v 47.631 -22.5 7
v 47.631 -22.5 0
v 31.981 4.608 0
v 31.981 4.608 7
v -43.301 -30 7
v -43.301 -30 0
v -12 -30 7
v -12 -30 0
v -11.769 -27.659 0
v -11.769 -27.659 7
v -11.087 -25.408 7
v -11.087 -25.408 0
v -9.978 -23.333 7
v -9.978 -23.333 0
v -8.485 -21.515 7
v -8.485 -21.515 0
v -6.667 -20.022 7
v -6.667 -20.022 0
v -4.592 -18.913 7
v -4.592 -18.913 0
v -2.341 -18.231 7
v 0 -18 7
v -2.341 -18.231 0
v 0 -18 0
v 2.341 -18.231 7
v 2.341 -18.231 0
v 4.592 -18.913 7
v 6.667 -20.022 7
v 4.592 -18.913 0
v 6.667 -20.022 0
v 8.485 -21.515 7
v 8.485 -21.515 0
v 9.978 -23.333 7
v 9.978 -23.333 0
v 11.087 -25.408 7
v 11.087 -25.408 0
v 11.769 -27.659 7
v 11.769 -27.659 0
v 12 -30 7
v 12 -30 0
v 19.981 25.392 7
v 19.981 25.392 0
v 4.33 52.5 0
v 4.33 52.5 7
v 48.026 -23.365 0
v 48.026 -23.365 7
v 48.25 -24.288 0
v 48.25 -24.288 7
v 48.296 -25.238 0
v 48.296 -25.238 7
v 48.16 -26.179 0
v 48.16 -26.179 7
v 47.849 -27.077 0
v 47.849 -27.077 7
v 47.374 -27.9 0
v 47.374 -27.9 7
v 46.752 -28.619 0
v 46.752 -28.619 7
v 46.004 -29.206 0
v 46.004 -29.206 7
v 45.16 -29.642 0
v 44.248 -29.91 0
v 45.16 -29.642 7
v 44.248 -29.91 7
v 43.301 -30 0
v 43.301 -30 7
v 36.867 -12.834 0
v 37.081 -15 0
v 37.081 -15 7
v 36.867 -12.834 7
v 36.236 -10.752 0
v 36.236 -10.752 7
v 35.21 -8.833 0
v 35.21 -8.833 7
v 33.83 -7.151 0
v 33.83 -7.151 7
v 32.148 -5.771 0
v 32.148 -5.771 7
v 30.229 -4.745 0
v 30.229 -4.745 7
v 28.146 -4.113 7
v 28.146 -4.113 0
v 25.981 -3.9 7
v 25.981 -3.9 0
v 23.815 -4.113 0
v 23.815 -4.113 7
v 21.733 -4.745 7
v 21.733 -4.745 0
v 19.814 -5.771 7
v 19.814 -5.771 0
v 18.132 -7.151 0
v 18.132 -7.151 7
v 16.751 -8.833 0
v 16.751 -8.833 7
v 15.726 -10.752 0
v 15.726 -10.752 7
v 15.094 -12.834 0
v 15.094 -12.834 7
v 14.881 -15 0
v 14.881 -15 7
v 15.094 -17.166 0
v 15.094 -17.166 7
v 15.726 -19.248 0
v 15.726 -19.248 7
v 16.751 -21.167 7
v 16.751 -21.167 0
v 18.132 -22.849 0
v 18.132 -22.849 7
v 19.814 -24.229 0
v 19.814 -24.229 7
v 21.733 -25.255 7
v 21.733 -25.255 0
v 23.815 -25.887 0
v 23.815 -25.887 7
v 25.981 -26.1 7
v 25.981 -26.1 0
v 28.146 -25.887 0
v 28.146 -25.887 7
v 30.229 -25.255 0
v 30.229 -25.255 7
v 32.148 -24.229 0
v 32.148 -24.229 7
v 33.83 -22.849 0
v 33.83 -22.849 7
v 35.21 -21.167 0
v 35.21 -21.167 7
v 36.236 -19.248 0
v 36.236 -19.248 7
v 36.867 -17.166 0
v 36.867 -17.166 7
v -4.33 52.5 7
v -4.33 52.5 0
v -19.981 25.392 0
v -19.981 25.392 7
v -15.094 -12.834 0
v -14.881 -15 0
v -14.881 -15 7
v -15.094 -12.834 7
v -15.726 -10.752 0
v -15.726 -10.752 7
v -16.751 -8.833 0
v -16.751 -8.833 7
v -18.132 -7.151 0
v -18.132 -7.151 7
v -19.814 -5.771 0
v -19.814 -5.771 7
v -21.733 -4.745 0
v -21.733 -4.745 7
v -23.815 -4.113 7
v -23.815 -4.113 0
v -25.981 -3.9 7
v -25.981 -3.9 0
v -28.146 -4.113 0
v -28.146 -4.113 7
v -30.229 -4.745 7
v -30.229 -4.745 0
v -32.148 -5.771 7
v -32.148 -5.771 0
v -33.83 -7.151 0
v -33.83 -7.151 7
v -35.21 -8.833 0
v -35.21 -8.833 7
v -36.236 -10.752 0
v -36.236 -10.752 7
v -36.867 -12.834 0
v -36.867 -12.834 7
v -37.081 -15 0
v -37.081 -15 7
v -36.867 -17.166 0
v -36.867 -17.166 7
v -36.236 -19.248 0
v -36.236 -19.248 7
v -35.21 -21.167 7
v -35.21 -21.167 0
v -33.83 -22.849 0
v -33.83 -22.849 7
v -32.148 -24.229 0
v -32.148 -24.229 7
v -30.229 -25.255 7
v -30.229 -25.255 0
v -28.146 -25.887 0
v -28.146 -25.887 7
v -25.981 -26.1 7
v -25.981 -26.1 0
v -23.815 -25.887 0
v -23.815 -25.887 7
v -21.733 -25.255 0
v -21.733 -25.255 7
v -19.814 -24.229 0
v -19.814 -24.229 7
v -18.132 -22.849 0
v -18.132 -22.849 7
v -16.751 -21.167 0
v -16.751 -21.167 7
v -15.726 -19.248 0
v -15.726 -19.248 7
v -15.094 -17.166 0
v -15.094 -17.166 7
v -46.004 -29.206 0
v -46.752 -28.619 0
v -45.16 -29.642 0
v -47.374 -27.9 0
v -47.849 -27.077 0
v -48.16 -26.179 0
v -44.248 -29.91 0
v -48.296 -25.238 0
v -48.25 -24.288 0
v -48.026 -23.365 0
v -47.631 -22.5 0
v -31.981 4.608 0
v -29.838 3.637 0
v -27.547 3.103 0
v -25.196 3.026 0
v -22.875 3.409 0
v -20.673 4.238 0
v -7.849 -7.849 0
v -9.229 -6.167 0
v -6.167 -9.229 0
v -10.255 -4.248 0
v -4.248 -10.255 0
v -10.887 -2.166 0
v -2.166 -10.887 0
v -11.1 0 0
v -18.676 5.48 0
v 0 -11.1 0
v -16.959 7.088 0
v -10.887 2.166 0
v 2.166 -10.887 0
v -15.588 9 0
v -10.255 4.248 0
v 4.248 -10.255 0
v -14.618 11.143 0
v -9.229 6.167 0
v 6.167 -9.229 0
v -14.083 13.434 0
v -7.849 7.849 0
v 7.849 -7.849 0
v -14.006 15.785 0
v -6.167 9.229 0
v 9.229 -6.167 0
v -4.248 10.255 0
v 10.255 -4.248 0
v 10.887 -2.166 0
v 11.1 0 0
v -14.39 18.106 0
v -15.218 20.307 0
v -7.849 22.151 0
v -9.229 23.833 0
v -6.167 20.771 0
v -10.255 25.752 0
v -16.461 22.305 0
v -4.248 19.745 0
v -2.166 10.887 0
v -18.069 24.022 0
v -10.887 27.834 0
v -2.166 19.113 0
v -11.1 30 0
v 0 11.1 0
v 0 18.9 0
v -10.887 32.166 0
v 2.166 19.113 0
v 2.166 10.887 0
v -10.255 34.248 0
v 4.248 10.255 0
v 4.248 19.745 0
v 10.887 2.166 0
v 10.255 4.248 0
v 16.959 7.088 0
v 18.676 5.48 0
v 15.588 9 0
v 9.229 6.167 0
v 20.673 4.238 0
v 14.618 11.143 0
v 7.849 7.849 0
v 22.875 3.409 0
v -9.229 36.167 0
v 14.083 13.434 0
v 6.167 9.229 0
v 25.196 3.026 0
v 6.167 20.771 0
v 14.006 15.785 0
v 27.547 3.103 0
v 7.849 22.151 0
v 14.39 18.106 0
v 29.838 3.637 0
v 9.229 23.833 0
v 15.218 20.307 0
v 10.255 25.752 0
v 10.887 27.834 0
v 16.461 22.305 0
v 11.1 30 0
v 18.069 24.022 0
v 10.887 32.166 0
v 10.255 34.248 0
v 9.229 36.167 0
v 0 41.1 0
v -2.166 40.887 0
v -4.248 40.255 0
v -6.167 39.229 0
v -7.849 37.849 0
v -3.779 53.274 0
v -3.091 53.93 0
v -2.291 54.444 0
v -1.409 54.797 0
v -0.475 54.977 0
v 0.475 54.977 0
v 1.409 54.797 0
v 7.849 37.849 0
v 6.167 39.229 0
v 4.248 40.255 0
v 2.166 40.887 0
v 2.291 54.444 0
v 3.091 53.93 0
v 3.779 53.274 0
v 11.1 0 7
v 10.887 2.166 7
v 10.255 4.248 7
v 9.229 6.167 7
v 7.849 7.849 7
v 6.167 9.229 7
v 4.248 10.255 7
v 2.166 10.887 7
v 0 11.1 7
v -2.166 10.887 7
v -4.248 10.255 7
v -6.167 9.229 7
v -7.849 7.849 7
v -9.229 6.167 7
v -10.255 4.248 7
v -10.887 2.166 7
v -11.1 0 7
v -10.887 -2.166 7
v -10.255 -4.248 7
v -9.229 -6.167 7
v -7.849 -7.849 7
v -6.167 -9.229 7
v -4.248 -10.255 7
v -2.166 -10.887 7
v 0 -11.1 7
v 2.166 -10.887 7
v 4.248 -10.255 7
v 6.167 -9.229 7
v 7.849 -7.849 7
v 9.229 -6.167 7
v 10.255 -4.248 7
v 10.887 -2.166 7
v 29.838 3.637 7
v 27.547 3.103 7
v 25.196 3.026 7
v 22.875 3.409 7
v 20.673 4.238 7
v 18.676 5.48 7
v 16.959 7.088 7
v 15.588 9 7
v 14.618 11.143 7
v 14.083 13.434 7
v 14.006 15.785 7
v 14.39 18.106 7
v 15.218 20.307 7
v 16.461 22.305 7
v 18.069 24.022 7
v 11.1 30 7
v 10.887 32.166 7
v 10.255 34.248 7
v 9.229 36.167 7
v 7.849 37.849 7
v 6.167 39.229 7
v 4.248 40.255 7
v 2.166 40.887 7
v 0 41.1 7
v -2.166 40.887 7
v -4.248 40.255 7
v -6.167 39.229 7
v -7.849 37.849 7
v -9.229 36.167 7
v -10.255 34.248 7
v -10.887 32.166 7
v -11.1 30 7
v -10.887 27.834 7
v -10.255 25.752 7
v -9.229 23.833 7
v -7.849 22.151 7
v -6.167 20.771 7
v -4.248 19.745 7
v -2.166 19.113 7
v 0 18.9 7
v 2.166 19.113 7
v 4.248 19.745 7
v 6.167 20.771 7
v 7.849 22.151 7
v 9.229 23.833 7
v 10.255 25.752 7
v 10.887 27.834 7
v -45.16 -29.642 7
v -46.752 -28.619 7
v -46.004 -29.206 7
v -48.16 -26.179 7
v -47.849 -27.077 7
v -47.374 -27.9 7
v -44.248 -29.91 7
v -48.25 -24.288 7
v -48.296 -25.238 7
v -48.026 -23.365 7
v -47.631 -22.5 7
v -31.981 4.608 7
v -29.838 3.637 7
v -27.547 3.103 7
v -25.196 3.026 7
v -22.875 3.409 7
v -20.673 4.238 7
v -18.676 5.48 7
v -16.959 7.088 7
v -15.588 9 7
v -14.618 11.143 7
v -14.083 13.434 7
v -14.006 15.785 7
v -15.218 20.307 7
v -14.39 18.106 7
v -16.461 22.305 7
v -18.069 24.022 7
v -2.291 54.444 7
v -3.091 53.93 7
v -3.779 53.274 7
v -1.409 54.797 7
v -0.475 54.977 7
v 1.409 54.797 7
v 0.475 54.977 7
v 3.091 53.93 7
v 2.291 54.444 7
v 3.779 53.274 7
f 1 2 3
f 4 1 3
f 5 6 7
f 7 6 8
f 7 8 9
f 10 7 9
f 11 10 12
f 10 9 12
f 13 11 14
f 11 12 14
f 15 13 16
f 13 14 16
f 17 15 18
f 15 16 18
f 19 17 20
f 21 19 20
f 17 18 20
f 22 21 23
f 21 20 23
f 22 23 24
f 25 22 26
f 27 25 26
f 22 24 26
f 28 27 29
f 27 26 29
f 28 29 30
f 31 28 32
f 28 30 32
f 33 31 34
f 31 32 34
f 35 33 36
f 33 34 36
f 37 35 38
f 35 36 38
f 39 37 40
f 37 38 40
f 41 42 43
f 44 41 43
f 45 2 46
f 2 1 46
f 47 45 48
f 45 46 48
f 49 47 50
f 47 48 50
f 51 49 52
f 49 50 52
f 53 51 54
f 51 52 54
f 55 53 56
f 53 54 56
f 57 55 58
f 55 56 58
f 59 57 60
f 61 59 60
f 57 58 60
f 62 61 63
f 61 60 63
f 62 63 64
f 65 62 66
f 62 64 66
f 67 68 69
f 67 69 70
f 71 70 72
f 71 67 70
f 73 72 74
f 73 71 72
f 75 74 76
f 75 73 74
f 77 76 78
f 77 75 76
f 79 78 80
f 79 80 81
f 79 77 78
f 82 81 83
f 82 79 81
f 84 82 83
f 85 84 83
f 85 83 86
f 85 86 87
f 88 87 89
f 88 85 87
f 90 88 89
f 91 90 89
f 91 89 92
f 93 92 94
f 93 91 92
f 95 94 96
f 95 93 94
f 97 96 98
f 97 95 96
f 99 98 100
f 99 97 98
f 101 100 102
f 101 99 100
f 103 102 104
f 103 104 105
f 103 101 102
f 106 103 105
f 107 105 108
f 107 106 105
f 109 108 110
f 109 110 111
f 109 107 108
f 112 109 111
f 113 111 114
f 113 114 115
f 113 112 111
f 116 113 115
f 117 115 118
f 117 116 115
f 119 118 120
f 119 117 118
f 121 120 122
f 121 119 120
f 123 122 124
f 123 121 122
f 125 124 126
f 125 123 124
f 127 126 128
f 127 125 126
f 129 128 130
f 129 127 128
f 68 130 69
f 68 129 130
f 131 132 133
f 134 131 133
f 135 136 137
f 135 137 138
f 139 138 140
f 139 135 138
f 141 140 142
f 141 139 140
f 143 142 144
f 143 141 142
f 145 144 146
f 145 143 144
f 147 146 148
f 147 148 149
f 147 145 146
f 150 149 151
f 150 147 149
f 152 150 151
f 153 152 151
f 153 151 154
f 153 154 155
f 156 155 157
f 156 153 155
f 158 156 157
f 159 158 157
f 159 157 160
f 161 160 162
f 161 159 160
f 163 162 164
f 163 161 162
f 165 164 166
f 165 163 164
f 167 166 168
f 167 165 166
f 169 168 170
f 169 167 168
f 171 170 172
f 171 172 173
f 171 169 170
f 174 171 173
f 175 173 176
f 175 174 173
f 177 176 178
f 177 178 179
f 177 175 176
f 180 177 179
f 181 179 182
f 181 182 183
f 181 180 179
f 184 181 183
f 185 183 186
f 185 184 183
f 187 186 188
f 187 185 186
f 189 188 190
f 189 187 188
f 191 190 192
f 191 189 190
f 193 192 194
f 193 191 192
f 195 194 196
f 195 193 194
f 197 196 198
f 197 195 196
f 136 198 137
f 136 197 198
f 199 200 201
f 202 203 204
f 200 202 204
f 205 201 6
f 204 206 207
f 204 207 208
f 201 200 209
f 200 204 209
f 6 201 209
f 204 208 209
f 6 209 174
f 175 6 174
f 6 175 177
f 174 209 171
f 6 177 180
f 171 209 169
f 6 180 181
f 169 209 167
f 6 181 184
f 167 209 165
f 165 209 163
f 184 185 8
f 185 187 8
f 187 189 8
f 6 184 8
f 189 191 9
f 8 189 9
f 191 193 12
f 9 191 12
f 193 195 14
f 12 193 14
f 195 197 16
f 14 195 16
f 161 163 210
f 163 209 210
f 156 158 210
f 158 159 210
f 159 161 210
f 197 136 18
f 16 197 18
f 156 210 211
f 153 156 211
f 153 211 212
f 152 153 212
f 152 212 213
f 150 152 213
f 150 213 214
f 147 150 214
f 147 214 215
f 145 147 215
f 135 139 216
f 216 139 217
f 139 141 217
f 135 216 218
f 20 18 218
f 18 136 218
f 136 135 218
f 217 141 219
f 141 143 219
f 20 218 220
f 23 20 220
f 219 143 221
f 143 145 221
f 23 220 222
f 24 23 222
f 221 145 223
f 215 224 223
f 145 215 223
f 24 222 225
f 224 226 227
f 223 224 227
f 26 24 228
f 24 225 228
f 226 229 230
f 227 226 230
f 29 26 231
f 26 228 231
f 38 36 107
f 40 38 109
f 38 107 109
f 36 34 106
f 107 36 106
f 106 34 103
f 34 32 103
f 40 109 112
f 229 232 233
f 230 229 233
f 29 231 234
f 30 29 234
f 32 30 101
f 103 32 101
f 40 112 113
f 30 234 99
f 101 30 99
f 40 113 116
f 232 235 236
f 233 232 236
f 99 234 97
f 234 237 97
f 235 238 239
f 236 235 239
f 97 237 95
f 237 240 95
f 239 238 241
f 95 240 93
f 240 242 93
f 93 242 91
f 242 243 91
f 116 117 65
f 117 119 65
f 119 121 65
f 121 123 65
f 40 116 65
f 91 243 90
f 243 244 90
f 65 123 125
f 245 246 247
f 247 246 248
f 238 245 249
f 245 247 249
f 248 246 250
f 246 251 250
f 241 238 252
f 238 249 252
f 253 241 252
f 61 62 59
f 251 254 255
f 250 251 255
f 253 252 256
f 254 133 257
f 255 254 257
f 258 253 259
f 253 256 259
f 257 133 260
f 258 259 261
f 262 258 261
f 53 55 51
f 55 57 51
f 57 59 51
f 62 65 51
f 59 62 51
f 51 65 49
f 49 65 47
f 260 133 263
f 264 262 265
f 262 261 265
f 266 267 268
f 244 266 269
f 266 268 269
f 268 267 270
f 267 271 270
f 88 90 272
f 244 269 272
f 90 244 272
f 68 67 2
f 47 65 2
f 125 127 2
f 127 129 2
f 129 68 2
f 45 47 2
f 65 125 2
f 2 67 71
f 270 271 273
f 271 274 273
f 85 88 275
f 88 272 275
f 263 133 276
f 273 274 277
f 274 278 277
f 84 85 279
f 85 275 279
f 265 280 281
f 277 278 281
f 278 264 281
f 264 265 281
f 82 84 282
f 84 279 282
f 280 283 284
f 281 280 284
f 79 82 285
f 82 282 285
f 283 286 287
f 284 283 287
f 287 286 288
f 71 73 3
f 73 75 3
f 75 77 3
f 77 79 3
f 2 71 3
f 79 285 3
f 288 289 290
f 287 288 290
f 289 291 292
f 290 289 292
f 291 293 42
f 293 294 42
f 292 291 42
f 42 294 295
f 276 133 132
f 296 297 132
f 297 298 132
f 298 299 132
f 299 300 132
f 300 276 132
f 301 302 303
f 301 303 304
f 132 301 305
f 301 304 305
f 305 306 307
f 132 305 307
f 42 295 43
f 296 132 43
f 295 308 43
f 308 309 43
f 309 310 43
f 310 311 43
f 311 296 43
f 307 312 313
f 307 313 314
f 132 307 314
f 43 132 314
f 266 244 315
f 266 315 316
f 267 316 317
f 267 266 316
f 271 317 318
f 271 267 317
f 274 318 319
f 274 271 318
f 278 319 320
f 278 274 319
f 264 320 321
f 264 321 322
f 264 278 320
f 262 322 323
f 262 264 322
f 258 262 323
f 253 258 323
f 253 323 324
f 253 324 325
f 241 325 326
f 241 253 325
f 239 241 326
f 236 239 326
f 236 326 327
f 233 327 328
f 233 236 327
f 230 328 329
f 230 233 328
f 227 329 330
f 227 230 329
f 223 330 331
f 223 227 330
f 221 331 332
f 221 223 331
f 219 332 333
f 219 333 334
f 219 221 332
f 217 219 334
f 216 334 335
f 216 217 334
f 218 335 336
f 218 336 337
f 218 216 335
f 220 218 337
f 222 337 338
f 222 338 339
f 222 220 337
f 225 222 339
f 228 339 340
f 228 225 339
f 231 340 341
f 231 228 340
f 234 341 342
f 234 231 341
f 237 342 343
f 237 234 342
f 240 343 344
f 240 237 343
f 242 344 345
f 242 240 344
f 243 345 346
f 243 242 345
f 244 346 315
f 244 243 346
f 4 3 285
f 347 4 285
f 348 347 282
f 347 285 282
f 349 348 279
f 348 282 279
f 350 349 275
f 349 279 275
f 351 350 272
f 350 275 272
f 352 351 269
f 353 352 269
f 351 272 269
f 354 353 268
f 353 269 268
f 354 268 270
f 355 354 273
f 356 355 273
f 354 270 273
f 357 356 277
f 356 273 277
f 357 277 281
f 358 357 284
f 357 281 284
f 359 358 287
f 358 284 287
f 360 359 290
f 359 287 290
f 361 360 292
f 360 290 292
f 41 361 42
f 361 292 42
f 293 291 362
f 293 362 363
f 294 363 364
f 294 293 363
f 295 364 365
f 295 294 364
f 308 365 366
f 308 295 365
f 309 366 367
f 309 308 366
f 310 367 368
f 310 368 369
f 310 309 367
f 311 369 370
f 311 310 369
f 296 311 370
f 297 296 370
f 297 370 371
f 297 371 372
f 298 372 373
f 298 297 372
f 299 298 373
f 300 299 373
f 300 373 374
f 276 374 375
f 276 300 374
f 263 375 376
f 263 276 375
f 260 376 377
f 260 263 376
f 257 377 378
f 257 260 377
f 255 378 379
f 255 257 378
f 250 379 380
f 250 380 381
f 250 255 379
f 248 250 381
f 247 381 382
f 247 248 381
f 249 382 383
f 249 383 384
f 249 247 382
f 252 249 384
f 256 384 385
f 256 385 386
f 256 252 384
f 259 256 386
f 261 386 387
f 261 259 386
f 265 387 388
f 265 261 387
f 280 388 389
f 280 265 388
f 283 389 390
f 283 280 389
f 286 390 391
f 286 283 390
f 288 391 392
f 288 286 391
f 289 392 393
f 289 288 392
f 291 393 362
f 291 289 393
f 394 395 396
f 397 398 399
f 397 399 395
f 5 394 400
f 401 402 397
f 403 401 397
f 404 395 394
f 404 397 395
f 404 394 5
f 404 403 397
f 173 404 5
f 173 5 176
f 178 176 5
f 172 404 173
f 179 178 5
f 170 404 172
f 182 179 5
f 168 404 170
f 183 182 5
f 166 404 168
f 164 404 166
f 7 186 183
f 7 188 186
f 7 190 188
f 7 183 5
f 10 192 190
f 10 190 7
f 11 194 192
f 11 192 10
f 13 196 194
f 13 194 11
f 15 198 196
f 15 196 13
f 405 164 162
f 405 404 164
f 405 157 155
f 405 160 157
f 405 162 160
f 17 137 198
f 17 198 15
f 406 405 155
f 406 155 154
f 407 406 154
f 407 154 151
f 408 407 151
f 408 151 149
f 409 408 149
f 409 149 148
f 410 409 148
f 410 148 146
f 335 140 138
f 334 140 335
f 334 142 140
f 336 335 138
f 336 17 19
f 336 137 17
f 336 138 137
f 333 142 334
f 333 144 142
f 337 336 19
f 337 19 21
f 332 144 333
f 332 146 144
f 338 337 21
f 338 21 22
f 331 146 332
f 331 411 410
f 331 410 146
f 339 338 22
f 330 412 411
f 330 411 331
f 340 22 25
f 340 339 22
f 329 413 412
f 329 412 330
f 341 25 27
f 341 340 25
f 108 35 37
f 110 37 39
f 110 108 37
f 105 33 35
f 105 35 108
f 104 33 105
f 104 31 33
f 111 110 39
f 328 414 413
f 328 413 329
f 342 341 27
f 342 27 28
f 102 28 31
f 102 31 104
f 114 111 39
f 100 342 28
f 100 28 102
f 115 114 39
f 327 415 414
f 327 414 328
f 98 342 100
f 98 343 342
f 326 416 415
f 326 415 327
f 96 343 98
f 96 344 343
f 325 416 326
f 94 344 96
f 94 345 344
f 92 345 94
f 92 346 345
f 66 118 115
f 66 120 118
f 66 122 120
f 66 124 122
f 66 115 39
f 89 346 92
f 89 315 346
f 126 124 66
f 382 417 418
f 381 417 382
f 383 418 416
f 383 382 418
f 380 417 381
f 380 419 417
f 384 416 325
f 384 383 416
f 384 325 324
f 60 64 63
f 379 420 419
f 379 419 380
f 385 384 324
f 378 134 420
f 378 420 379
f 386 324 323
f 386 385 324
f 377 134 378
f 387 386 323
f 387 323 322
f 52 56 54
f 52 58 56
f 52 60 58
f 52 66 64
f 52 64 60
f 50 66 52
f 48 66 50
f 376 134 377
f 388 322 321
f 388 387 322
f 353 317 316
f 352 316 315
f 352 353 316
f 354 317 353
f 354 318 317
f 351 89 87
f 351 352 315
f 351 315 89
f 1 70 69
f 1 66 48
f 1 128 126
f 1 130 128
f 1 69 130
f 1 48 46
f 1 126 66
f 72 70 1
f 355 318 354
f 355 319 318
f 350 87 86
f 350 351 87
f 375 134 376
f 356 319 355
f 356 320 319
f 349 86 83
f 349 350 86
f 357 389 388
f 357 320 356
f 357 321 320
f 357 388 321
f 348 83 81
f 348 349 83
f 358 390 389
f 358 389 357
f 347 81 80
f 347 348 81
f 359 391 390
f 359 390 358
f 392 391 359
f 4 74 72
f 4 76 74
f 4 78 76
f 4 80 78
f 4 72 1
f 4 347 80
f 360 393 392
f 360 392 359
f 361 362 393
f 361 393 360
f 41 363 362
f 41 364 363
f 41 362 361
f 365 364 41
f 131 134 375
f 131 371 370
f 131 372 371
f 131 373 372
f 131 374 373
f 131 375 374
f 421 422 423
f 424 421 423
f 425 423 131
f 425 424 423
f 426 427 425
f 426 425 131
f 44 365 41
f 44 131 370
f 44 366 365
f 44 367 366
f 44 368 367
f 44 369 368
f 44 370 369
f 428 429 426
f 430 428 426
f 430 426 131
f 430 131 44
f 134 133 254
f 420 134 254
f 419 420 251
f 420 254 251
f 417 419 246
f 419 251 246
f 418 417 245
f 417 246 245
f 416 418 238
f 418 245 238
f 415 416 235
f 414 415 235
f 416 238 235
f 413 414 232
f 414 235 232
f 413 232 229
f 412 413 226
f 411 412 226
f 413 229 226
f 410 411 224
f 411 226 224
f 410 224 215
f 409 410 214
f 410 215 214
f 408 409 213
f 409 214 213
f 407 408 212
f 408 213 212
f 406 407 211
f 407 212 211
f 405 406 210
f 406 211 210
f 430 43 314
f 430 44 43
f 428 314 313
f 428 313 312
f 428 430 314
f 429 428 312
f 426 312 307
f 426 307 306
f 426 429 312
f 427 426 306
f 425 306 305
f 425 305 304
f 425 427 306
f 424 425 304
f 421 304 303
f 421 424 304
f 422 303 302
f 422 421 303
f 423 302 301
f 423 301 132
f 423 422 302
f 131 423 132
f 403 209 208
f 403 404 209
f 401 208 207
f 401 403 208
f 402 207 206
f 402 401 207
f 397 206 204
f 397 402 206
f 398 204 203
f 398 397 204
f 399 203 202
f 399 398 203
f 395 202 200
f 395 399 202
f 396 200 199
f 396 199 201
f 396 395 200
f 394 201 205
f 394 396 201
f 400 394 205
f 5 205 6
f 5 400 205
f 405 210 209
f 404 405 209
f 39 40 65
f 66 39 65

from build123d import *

# Parameters (mm, degrees)
F0_R     = 11.1
F1_DEPTH = 7
F2_R     = 5


with BuildPart() as f1:
    # F0 (on Top) → F1 (new body)
    with BuildSketch(Plane.XY):
        with BuildLine():
            Line((19.980762, 25.392305), (0, 60))
            Line((0, 60), (-19.980762, 25.392305))
            ThreePointArc((-19.980762, 25.392305), (-15.588457, 9), (-31.980762, 4.607695))
            Line((-31.980762, 4.607695), (-51.961524, -30))
            Line((-51.961524, -30), (-12, -30))
            ThreePointArc((-12, -30), (0, -18), (12, -30))
            Line((12, -30), (51.961524, -30))
            Line((51.961524, -30), (31.980762, 4.607695))
            ThreePointArc((31.980762, 4.607695), (15.588457, 9), (19.980762, 25.392305))
        make_face()
        with Locations((-25.980762, -15)):
            Circle(F0_R, mode=Mode.SUBTRACT)
        with Locations((25.980762, -15)):
            Circle(F0_R, mode=Mode.SUBTRACT)
        Circle(F0_R, mode=Mode.SUBTRACT)
        with Locations((0, 30)):
            Circle(F0_R, mode=Mode.SUBTRACT)
    extrude(amount=F1_DEPTH)

    # F2
    f2_edges = [f1.edges().sort_by_distance(p)[0] for p in [
        (0, 60, 3.5),
        (51.961524, -30, 3.5),
        (-51.961524, -30, 3.5),
    ]]
    fillet(f2_edges, radius=F2_R)


solid = f1.part
